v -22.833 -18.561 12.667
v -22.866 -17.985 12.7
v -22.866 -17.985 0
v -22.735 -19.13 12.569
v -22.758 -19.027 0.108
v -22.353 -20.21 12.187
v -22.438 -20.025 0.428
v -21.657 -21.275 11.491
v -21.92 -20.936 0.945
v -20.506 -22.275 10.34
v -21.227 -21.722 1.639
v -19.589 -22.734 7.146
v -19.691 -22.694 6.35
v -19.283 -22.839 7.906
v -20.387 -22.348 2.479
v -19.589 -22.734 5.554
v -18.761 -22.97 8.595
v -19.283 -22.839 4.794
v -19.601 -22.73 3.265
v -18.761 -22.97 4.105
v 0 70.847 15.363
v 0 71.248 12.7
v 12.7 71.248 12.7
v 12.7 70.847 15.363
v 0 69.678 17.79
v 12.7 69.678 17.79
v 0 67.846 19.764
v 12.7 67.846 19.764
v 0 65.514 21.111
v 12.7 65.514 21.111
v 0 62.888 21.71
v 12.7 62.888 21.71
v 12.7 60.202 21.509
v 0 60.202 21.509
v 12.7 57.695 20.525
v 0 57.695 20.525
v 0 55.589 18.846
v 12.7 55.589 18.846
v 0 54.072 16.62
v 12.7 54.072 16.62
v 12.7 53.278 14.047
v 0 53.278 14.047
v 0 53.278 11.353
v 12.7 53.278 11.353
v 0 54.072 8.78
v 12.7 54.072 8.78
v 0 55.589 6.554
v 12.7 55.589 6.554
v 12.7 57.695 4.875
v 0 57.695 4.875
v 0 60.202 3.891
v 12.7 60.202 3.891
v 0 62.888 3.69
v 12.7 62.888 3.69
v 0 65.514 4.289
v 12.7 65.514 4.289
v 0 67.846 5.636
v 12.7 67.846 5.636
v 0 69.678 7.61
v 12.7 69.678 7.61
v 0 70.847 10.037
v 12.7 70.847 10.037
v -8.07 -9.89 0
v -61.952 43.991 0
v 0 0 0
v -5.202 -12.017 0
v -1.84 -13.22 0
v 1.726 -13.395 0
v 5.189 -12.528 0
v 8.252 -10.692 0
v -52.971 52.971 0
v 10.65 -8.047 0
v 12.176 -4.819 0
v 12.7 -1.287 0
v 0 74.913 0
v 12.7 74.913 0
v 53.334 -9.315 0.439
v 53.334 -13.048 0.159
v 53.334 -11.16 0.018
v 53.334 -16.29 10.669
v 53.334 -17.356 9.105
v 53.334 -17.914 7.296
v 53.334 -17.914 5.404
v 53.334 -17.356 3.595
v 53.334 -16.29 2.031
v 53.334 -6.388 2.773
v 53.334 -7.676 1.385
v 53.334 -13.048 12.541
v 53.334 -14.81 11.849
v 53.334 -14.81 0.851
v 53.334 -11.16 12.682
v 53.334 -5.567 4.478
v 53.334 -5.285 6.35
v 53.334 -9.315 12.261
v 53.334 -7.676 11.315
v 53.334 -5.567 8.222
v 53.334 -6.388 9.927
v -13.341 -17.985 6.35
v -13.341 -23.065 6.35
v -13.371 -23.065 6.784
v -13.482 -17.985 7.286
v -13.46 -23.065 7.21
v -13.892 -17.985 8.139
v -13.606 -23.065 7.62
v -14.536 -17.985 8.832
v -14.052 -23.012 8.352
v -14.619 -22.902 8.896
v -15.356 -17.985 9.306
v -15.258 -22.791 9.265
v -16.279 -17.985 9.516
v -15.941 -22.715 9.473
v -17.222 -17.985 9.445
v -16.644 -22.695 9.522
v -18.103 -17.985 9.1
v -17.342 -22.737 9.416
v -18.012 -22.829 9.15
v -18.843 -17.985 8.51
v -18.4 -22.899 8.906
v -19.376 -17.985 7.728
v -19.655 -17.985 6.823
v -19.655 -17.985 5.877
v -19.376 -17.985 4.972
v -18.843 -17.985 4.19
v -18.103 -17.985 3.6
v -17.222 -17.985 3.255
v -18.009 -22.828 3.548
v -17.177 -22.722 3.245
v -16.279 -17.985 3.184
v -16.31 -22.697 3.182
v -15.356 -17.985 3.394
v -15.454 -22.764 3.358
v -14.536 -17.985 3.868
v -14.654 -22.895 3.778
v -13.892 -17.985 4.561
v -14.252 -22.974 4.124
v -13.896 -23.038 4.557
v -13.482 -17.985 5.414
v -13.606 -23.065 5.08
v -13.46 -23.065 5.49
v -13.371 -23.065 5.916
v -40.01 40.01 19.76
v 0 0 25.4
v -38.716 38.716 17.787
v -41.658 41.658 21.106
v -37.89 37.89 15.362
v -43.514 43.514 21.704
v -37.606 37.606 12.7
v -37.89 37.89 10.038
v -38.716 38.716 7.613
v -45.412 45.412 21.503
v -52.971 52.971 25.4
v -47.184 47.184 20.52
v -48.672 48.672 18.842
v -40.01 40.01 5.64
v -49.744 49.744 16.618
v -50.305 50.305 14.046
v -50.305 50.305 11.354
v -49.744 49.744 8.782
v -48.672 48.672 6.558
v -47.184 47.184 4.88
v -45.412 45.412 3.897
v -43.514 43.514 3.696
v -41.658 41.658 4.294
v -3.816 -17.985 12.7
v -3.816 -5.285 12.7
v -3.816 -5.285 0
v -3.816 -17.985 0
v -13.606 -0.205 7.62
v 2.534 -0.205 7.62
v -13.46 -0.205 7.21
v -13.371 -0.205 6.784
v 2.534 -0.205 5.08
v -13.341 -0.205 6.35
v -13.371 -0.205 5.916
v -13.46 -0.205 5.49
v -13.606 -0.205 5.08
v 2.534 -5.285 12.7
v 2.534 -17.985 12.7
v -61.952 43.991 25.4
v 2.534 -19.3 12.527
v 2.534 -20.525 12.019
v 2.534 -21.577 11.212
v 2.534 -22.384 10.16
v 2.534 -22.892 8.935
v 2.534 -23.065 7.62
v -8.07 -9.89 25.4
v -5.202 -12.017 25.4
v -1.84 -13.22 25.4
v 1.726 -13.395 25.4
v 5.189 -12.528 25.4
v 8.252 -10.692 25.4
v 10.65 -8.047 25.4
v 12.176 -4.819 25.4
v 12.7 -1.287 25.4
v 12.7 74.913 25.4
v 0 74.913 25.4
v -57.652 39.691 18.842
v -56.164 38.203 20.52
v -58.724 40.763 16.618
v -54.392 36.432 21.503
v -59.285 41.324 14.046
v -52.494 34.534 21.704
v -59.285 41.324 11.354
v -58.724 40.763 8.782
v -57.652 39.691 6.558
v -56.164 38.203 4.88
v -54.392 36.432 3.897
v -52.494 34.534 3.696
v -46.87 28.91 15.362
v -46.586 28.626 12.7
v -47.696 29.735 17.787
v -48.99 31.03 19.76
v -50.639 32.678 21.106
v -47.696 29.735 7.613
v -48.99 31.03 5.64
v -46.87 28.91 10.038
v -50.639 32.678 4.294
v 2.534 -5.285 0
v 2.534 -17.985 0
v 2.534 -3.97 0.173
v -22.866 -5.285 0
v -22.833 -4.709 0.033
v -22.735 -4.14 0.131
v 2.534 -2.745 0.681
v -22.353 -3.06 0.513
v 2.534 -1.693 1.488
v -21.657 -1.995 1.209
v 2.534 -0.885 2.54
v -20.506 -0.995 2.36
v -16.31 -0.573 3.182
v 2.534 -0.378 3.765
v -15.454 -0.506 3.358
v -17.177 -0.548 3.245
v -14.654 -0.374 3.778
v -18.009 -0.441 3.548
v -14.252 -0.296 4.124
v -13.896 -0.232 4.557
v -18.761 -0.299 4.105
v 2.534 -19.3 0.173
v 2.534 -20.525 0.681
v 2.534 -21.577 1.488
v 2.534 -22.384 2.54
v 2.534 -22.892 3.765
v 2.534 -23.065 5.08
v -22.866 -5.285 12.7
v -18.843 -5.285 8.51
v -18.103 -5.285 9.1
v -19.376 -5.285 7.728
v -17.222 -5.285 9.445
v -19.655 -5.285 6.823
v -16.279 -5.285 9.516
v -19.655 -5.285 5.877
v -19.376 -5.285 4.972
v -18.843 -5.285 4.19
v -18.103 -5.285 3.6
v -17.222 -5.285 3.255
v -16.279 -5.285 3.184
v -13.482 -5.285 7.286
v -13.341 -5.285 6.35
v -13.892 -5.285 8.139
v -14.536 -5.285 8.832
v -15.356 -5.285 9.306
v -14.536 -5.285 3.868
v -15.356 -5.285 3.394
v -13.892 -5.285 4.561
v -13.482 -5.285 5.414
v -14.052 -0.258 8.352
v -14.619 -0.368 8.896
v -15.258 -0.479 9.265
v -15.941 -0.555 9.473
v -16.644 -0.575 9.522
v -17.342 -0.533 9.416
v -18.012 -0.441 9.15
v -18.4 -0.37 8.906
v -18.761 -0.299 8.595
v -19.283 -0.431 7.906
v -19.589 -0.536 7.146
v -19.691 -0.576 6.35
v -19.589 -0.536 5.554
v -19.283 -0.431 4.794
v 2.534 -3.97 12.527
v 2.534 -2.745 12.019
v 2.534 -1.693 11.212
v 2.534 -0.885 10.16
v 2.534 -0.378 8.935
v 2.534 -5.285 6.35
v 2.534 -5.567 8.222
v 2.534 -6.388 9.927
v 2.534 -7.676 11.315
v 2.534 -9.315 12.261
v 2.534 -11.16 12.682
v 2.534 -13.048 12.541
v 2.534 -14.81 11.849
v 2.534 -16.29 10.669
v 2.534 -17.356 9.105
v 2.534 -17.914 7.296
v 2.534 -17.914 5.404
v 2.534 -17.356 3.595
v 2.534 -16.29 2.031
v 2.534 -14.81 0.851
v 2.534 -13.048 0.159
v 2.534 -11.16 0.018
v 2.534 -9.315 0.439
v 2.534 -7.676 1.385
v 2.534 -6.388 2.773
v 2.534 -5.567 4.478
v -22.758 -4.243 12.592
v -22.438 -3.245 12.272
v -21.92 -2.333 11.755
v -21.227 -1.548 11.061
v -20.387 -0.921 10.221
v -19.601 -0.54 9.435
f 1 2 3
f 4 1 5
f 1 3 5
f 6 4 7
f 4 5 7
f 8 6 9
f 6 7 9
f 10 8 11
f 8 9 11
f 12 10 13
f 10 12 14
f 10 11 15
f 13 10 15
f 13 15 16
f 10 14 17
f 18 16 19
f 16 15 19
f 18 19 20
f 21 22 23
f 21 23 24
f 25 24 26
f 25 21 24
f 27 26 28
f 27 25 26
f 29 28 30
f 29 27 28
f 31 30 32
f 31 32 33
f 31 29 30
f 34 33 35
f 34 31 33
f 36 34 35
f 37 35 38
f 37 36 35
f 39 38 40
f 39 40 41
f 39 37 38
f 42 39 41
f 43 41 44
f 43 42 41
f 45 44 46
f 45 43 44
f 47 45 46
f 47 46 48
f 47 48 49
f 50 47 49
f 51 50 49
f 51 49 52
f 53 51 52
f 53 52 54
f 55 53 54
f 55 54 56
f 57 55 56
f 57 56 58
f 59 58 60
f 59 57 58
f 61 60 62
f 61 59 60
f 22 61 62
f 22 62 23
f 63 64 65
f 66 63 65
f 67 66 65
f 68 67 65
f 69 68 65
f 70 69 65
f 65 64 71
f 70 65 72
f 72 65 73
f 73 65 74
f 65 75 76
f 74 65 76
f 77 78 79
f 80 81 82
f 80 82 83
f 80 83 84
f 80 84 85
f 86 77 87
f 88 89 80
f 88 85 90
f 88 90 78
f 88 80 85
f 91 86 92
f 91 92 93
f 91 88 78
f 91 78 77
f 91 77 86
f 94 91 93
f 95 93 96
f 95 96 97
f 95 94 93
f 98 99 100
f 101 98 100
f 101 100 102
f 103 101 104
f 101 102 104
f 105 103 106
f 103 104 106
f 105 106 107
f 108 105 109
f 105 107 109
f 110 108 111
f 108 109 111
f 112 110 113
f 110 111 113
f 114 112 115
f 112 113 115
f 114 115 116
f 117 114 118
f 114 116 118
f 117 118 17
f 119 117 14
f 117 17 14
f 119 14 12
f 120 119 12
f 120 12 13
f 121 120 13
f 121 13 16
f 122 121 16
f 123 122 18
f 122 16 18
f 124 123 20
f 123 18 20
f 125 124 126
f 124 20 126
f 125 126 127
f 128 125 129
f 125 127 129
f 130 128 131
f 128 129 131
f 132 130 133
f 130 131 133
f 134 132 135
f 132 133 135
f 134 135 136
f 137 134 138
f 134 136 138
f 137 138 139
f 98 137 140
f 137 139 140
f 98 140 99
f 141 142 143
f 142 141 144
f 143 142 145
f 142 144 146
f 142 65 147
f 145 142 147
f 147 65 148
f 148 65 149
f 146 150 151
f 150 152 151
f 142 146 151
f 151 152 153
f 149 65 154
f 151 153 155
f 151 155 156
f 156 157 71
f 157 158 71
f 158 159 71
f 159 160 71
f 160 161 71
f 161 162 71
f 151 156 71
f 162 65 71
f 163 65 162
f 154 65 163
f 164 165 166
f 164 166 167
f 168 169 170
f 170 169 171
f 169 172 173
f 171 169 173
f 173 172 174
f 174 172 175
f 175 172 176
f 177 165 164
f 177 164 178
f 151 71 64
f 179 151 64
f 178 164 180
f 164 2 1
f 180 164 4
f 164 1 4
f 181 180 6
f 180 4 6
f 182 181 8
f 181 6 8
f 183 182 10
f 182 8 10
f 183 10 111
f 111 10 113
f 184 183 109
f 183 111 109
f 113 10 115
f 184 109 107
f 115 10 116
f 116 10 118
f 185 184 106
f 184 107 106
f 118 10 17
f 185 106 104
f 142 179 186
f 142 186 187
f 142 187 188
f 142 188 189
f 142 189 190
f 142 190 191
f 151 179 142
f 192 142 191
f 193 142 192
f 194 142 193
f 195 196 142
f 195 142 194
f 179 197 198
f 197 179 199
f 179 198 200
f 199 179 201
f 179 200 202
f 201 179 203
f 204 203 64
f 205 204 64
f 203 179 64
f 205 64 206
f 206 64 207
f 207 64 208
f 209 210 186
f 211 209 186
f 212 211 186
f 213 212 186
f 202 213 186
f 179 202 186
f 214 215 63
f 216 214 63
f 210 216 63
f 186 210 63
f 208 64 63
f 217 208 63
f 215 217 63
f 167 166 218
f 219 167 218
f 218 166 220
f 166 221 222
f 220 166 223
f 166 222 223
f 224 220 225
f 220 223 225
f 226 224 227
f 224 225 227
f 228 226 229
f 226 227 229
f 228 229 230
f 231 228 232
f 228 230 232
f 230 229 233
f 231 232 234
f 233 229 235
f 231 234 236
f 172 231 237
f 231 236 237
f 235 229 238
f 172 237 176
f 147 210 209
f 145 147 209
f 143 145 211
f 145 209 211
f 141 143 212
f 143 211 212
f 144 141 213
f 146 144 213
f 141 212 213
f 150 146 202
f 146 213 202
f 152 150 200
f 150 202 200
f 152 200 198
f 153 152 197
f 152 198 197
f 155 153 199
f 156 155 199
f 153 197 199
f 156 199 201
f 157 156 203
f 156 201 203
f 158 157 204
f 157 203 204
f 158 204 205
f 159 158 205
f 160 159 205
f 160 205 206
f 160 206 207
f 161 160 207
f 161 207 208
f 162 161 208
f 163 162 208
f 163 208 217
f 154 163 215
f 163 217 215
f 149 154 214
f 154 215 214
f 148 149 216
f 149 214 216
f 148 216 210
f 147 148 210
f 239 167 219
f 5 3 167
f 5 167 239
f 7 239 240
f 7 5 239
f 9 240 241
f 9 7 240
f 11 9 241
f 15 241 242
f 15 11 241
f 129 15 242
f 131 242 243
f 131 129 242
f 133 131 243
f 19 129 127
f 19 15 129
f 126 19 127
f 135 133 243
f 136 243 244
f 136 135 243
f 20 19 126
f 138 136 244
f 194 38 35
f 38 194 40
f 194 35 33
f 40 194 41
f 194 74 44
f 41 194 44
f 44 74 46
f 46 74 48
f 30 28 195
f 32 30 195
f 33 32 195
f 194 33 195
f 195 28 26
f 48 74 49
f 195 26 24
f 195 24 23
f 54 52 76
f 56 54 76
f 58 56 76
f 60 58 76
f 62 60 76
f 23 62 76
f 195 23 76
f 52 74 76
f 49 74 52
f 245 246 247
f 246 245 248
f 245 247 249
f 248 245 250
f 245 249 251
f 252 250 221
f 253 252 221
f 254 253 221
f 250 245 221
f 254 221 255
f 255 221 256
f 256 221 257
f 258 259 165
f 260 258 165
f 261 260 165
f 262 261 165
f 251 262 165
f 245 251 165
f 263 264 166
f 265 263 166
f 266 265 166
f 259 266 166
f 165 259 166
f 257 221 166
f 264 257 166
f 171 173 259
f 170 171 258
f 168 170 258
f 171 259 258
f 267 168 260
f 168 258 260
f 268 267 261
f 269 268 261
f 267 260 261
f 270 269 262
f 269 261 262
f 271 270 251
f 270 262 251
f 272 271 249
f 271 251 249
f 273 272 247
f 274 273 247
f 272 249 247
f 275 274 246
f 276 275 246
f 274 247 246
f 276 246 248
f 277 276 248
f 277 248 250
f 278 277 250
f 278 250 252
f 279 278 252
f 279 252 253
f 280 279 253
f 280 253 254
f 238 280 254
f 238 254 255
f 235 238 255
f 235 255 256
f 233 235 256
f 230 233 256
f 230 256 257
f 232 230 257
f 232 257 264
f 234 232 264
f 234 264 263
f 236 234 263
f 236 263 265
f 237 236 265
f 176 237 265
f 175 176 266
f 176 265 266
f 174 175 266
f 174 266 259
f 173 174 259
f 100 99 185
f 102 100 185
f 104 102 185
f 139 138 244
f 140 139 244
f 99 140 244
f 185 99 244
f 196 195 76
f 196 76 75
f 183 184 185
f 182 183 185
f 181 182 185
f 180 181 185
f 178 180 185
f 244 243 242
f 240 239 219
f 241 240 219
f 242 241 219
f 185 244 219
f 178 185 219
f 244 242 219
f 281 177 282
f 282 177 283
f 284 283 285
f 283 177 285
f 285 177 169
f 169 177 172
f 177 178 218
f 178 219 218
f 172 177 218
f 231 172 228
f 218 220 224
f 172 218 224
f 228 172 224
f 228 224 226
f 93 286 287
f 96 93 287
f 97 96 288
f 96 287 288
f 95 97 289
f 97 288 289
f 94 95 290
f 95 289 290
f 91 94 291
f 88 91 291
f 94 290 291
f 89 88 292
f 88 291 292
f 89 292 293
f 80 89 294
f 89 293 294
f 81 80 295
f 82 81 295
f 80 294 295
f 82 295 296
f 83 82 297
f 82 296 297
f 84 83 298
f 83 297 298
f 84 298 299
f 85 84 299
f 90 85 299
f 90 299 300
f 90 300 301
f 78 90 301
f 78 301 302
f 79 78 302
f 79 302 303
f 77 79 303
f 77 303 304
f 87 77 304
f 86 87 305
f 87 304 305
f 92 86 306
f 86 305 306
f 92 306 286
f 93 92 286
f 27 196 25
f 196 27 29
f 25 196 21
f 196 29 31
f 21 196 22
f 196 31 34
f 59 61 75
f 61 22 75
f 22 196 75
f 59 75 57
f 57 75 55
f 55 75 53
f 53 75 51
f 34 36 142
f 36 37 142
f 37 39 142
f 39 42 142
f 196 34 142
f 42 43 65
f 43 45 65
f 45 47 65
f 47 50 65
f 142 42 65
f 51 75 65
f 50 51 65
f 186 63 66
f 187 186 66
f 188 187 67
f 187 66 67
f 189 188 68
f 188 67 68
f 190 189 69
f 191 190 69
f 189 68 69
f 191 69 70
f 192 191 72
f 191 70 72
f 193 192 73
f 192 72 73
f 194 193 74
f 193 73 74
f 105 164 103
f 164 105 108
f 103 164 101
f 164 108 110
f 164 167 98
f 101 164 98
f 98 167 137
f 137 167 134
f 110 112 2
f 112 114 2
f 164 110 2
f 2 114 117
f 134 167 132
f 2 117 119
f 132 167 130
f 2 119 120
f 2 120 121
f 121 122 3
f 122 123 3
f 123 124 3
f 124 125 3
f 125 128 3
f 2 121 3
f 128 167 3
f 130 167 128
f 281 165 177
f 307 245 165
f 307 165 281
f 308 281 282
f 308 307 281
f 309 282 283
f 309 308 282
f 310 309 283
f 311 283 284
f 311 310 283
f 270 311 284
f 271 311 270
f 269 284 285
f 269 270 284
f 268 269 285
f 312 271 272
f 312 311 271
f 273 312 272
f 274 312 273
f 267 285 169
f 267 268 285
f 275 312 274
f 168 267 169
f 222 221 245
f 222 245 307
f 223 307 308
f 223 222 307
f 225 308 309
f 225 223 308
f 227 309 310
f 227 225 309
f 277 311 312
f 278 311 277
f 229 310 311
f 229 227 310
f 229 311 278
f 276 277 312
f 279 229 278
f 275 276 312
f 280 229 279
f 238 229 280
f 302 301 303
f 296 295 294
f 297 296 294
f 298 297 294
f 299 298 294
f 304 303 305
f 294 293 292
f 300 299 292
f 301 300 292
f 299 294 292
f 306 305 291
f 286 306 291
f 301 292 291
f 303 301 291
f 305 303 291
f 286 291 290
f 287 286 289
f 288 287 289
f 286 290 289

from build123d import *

# Parameters (mm, degrees)
F1_DEPTH     = 25.4
F2_R         = 9.0354062308
F3_DEPTH     = 12.7
F4_R         = 9.0297
F5_DEPTH     = 12.7
F7_DEPTH     = 12.7
F8_R         = 3.175
F9_DEPTH     = 97.9786220541
F10_R        = 6.35
F11_DEPTH    = 50.8
F12_T1_DEPTH = 50.8
F12_T3_DEPTH = 38.1


# Not quite as in the source:
# - a fillet or chamfer that OpenCascade refuses, or shapes differently, is made with other operations: its cross-section is extruded or revolved along the edge and cut away or added


with BuildPart() as f1:
    # F0 (on Top) → F1 (new body)
    with BuildSketch(Plane.XY):
        with BuildLine():
            Line((12.7, 74.9127892945), (0, 74.9127892945))
            Line((0, 74.9127892945), (0, 0))
            Line((0, 0), (-52.9713413077, 52.9713413077))
            Line((-52.9713413077, 52.9713413077), (-61.9515974288, 43.9910851867))
            Line((-61.9515974288, 43.9910851867), (-8.0700607024, -9.8904515398))
            ThreePointArc((-8.0700607024, -9.8904515398), (5.18922052, -12.5278865574), (12.7, -1.2872107055))
            Line((12.7, -1.2872107055), (12.7, 74.9127892945))
        make_face()
    extrude(amount=F1_DEPTH)

    # F2 (on Right) → F3 (cut, through all)
    with BuildSketch(Plane.YZ):
        with Locations((62.2127892945, 12.7)):
            Circle(F2_R)
    extrude(amount=F3_DEPTH, mode=Mode.SUBTRACT)

    # F4 (on face) → F5 (cut, through all)
    with BuildSketch(Plane(origin=(-8.9802561211, -8.9802561211, 0), x_dir=(0.7071067812, -0.7071067812, 0), z_dir=(-0.7071067812, -0.7071067812, 0))):
        with Locations((-62.2127892945, 12.7)):
            Circle(F4_R)
    extrude(amount=-F5_DEPTH, mode=Mode.SUBTRACT)


with BuildPart() as f7:
    # F6 (on Top) → F7 (new body)
    with BuildSketch(Plane.XY):
        Polygon((-3.8157885445, -17.9848327596), (-22.8657885445, -17.9848327596), (-22.8657885445, -23.0648327596), (2.5342114555, -23.0648327596), (2.5342114555, -0.2048327596), (-22.8657885445, -0.2048327596), (-22.8657885445, -5.2848327596), (-3.8157885445, -5.2848327596), align=None)
    extrude(amount=F7_DEPTH)

    # F8 (on face) → F9 (cut, through all)
    with BuildSketch(Plane.XZ.offset(23.0648327596)):
        with Locations((-16.5157885445, 6.35)):
            Circle(F8_R)
    extrude(amount=-F9_DEPTH, mode=Mode.SUBTRACT)

    # F12: fillet of radius 5.08 on 6 edges, made by hand

    # F12_s2 → F12_t1 (cut)
    with BuildSketch(Plane.YZ.offset(-35.5657885445)):
        with BuildLine():
            ThreePointArc((-17.9848327596, 12.7), (-21.576935208, 11.2121024484), (-23.0648327596, 7.62))
            Line((-23.0648327596, 7.62), (-23.0648327596, 12.7))
            Line((-23.0648327596, 12.7), (-17.9848327596, 12.7))
        make_face()
        with BuildLine():
            ThreePointArc((-17.9848327596, 0), (-21.576935208, 1.4878975516), (-23.0648327596, 5.08))
            Line((-23.0648327596, 5.08), (-23.0648327596, 0))
            Line((-23.0648327596, 0), (-17.9848327596, 0))
        make_face()
        with BuildLine():
            ThreePointArc((-5.2848327596, 0), (-1.6927303112, 1.4878975516), (-0.2048327596, 5.08))
            Line((-0.2048327596, 5.08), (-0.2048327596, 0))
            Line((-0.2048327596, 0), (-5.2848327596, 0))
        make_face()
        with BuildLine():
            ThreePointArc((-5.2848327596, 12.7), (-1.6927303112, 11.2121024484), (-0.2048327596, 7.62))
            Line((-0.2048327596, 7.62), (-0.2048327596, 12.7))
            Line((-0.2048327596, 12.7), (-5.2848327596, 12.7))
        make_face()
    extrude(amount=F12_T1_DEPTH, mode=Mode.SUBTRACT)

    # F12_s4 → F12_t3 (cut)
    with BuildSketch(Plane.XY.offset(-12.7)):
        with BuildLine():
            ThreePointArc((-22.8657885445, -17.9848327596), (-21.3778909929, -21.576935208), (-17.7857885445, -23.0648327596))
            Line((-17.7857885445, -23.0648327596), (-22.8657885445, -23.0648327596))
            Line((-22.8657885445, -23.0648327596), (-22.8657885445, -17.9848327596))
        make_face()
        with BuildLine():
            ThreePointArc((-22.8657885445, -5.2848327596), (-21.3778909929, -1.6927303112), (-17.7857885445, -0.2048327596))
            Line((-17.7857885445, -0.2048327596), (-22.8657885445, -0.2048327596))
            Line((-22.8657885445, -0.2048327596), (-22.8657885445, -5.2848327596))
        make_face()
    extrude(amount=F12_T3_DEPTH, mode=Mode.SUBTRACT)


with BuildPart() as f11:
    # F10 (on face) → F11 (new body)
    with BuildSketch(Plane.YZ.offset(2.5342114555)):
        with Locations((-11.6348327596, 6.35)):
            Circle(F10_R)
    extrude(amount=F11_DEPTH)


solid = Compound([f1.part, f7.part, f11.part])
